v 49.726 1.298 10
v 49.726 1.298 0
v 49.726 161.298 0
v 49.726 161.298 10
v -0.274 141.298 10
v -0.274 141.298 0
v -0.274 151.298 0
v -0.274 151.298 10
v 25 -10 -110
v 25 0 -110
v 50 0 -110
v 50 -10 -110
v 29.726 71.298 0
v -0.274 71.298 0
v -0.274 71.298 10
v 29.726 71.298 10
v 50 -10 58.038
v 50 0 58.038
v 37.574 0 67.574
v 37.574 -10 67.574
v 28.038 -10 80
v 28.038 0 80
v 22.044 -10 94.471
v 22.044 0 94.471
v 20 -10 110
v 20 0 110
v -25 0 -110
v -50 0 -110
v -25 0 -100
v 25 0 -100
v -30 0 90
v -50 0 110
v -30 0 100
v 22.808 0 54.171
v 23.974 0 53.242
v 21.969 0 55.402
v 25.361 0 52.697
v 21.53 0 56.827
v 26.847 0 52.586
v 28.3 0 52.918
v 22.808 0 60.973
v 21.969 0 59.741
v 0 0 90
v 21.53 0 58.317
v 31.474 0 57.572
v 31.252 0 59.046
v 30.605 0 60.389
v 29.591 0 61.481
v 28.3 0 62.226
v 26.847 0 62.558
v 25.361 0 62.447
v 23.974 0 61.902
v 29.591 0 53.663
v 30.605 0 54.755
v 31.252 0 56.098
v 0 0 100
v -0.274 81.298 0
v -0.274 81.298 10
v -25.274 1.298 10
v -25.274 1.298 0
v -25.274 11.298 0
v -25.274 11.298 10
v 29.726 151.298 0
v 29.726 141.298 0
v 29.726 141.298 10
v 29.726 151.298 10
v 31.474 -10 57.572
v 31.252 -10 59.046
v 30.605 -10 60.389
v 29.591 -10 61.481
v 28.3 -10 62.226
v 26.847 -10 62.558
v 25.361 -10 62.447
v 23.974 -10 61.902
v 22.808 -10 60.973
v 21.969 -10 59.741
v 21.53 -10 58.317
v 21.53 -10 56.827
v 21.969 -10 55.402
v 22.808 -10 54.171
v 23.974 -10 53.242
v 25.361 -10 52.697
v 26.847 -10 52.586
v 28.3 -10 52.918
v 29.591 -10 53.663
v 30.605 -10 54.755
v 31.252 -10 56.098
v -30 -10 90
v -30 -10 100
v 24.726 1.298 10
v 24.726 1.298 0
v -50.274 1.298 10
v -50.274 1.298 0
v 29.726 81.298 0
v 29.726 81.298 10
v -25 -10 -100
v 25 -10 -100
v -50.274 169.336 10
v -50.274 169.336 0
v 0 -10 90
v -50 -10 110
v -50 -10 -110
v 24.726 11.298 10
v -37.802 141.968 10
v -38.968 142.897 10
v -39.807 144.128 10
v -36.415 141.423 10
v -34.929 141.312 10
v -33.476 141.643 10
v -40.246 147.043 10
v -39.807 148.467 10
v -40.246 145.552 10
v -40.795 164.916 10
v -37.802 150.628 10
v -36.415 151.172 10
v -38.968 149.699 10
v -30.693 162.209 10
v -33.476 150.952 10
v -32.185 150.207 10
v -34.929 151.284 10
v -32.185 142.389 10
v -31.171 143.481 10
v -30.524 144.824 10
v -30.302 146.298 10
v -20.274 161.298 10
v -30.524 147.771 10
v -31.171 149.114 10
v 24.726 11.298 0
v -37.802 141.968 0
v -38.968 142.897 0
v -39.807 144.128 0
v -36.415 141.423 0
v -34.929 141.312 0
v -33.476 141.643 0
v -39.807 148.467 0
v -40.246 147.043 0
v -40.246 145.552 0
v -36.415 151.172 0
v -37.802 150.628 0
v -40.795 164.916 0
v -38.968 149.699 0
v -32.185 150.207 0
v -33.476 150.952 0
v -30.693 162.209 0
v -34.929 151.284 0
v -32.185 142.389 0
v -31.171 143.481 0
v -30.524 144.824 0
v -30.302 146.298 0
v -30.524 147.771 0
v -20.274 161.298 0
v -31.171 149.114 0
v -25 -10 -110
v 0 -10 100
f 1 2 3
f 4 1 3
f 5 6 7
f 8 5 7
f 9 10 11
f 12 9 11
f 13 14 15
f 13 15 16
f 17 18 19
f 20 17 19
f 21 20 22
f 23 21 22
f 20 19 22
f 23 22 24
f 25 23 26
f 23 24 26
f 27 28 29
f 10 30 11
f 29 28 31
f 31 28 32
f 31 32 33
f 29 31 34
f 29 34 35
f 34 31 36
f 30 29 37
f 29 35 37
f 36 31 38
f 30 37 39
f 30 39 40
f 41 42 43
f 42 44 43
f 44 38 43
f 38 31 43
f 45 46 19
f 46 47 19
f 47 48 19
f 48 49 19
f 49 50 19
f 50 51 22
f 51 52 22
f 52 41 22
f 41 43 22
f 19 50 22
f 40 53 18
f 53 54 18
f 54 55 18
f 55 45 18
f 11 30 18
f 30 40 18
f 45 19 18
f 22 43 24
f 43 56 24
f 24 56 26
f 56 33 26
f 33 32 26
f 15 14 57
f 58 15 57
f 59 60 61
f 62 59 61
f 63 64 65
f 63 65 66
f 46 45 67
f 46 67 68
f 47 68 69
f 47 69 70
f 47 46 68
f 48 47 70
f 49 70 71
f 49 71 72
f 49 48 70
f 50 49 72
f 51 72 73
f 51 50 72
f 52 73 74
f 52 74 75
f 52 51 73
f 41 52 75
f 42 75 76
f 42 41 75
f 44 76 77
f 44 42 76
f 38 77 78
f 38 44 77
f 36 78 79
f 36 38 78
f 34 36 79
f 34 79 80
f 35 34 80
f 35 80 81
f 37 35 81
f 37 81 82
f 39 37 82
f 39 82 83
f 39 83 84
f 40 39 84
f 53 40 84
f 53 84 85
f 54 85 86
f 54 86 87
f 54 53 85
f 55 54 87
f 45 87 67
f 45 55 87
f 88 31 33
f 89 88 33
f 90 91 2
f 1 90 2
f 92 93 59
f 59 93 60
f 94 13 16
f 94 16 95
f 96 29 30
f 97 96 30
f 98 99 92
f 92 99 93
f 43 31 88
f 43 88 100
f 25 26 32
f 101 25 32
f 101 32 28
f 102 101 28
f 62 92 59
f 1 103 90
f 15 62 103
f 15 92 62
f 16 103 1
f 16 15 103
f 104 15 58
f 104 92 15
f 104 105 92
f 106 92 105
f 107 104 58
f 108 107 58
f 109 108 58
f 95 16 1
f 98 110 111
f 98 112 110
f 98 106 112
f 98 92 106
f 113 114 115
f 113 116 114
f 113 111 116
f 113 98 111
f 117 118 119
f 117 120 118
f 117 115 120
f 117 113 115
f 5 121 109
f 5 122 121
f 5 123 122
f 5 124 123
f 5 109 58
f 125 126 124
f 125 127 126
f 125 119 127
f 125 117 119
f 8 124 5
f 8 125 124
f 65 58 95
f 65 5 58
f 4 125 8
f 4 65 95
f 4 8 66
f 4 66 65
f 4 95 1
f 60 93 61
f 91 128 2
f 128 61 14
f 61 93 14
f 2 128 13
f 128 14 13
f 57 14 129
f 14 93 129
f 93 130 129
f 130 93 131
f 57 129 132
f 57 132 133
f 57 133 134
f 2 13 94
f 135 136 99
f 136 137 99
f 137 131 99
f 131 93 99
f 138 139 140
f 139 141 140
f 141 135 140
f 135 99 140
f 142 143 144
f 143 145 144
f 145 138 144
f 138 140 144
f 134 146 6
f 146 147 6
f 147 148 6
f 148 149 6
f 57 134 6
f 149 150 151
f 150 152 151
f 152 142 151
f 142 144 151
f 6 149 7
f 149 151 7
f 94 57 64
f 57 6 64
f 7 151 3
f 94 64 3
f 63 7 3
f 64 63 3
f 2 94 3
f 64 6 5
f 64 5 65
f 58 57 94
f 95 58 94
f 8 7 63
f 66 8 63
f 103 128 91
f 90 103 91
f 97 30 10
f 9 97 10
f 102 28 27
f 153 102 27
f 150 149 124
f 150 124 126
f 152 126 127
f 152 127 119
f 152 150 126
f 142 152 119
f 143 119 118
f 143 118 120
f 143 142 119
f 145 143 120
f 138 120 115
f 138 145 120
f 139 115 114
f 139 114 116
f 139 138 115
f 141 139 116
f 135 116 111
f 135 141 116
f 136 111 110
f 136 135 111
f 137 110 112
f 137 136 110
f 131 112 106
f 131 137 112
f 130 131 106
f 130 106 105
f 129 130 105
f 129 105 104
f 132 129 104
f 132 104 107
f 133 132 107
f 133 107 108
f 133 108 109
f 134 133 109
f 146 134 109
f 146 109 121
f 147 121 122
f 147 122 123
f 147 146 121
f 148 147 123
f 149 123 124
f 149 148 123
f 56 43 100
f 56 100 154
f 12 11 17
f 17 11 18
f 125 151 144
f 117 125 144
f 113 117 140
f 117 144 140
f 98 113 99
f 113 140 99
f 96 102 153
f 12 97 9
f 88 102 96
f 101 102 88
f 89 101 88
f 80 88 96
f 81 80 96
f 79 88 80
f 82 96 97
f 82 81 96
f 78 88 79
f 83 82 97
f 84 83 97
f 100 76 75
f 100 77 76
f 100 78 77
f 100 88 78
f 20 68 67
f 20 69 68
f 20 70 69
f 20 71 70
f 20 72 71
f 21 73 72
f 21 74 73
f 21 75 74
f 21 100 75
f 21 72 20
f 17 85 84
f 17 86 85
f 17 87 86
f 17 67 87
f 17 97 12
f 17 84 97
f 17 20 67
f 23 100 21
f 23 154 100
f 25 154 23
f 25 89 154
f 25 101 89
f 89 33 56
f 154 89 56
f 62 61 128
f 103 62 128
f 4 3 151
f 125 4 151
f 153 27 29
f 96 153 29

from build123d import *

# Parameters (mm, degrees)
F0_W     = 30
F0_H     = 10
F0_R     = 5
F1_DEPTH = 10
F2_W     = 30
F2_H     = 10
F2_R     = 5
F3_DEPTH = 10


# Not quite as in the source:
# - a feature names something its author has since deleted; it is built from what else it names


with BuildPart() as f1:
    # F0 (on Front) → F1 (new body)
    with BuildSketch(Plane.XZ):
        with BuildLine():
            ThreePointArc((50, 58.0384757729), (28.0384757729, 80), (20, 110))
            Line((20, 110), (-50, 110))
            Line((-50, 110), (-50, -110))
            Line((-50, -110), (-25, -110))
            Line((-25, -110), (-25, -100))
            Line((-25, -100), (25, -100))
            Line((25, -100), (25, -110))
            Line((25, -110), (50, -110))
            Line((50, -110), (50, 58.0384757729))
        make_face()
        with Locations((-15, 95)):
            Rectangle(F0_W, F0_H, mode=Mode.SUBTRACT)
        with Locations((26.4736674726, 57.5719177723)):
            Circle(F0_R, mode=Mode.SUBTRACT)
    extrude(amount=F1_DEPTH)


with BuildPart() as f3:
    # F2 (on Top) → F3 (new body)
    with BuildSketch(Plane.XY):
        with BuildLine():
            ThreePointArc((-20.2736711096, 161.2976664366), (-35.8028138157, 163.3421168592), (-50.2736711096, 169.3361422095))
            Line((-50.2736711096, 169.3361422095), (-50.2736711096, 1.2976664366))
            Line((-50.2736711096, 1.2976664366), (-25.2736711096, 1.2976664366))
            Line((-25.2736711096, 1.2976664366), (-25.2736711096, 11.2976664366))
            Line((-25.2736711096, 11.2976664366), (24.7263288904, 11.2976664366))
            Line((24.7263288904, 11.2976664366), (24.7263288904, 1.2976664366))
            Line((24.7263288904, 1.2976664366), (49.7263288904, 1.2976664366))
            Line((49.7263288904, 1.2976664366), (49.7263288904, 161.2976664366))
            Line((49.7263288904, 161.2976664366), (-20.2736711096, 161.2976664366))
        make_face()
        with Locations((14.7263288904, 76.2976664366)):
            Rectangle(F2_W, F2_H, mode=Mode.SUBTRACT)
        with Locations((-35.3022602503, 146.2976664366)):
            Circle(F2_R, mode=Mode.SUBTRACT)
        with Locations((14.7263288904, 146.2976664366)):
            Rectangle(F2_W, F2_H, mode=Mode.SUBTRACT)
    extrude(amount=F3_DEPTH)


solid = Compound([f1.part, f3.part])
